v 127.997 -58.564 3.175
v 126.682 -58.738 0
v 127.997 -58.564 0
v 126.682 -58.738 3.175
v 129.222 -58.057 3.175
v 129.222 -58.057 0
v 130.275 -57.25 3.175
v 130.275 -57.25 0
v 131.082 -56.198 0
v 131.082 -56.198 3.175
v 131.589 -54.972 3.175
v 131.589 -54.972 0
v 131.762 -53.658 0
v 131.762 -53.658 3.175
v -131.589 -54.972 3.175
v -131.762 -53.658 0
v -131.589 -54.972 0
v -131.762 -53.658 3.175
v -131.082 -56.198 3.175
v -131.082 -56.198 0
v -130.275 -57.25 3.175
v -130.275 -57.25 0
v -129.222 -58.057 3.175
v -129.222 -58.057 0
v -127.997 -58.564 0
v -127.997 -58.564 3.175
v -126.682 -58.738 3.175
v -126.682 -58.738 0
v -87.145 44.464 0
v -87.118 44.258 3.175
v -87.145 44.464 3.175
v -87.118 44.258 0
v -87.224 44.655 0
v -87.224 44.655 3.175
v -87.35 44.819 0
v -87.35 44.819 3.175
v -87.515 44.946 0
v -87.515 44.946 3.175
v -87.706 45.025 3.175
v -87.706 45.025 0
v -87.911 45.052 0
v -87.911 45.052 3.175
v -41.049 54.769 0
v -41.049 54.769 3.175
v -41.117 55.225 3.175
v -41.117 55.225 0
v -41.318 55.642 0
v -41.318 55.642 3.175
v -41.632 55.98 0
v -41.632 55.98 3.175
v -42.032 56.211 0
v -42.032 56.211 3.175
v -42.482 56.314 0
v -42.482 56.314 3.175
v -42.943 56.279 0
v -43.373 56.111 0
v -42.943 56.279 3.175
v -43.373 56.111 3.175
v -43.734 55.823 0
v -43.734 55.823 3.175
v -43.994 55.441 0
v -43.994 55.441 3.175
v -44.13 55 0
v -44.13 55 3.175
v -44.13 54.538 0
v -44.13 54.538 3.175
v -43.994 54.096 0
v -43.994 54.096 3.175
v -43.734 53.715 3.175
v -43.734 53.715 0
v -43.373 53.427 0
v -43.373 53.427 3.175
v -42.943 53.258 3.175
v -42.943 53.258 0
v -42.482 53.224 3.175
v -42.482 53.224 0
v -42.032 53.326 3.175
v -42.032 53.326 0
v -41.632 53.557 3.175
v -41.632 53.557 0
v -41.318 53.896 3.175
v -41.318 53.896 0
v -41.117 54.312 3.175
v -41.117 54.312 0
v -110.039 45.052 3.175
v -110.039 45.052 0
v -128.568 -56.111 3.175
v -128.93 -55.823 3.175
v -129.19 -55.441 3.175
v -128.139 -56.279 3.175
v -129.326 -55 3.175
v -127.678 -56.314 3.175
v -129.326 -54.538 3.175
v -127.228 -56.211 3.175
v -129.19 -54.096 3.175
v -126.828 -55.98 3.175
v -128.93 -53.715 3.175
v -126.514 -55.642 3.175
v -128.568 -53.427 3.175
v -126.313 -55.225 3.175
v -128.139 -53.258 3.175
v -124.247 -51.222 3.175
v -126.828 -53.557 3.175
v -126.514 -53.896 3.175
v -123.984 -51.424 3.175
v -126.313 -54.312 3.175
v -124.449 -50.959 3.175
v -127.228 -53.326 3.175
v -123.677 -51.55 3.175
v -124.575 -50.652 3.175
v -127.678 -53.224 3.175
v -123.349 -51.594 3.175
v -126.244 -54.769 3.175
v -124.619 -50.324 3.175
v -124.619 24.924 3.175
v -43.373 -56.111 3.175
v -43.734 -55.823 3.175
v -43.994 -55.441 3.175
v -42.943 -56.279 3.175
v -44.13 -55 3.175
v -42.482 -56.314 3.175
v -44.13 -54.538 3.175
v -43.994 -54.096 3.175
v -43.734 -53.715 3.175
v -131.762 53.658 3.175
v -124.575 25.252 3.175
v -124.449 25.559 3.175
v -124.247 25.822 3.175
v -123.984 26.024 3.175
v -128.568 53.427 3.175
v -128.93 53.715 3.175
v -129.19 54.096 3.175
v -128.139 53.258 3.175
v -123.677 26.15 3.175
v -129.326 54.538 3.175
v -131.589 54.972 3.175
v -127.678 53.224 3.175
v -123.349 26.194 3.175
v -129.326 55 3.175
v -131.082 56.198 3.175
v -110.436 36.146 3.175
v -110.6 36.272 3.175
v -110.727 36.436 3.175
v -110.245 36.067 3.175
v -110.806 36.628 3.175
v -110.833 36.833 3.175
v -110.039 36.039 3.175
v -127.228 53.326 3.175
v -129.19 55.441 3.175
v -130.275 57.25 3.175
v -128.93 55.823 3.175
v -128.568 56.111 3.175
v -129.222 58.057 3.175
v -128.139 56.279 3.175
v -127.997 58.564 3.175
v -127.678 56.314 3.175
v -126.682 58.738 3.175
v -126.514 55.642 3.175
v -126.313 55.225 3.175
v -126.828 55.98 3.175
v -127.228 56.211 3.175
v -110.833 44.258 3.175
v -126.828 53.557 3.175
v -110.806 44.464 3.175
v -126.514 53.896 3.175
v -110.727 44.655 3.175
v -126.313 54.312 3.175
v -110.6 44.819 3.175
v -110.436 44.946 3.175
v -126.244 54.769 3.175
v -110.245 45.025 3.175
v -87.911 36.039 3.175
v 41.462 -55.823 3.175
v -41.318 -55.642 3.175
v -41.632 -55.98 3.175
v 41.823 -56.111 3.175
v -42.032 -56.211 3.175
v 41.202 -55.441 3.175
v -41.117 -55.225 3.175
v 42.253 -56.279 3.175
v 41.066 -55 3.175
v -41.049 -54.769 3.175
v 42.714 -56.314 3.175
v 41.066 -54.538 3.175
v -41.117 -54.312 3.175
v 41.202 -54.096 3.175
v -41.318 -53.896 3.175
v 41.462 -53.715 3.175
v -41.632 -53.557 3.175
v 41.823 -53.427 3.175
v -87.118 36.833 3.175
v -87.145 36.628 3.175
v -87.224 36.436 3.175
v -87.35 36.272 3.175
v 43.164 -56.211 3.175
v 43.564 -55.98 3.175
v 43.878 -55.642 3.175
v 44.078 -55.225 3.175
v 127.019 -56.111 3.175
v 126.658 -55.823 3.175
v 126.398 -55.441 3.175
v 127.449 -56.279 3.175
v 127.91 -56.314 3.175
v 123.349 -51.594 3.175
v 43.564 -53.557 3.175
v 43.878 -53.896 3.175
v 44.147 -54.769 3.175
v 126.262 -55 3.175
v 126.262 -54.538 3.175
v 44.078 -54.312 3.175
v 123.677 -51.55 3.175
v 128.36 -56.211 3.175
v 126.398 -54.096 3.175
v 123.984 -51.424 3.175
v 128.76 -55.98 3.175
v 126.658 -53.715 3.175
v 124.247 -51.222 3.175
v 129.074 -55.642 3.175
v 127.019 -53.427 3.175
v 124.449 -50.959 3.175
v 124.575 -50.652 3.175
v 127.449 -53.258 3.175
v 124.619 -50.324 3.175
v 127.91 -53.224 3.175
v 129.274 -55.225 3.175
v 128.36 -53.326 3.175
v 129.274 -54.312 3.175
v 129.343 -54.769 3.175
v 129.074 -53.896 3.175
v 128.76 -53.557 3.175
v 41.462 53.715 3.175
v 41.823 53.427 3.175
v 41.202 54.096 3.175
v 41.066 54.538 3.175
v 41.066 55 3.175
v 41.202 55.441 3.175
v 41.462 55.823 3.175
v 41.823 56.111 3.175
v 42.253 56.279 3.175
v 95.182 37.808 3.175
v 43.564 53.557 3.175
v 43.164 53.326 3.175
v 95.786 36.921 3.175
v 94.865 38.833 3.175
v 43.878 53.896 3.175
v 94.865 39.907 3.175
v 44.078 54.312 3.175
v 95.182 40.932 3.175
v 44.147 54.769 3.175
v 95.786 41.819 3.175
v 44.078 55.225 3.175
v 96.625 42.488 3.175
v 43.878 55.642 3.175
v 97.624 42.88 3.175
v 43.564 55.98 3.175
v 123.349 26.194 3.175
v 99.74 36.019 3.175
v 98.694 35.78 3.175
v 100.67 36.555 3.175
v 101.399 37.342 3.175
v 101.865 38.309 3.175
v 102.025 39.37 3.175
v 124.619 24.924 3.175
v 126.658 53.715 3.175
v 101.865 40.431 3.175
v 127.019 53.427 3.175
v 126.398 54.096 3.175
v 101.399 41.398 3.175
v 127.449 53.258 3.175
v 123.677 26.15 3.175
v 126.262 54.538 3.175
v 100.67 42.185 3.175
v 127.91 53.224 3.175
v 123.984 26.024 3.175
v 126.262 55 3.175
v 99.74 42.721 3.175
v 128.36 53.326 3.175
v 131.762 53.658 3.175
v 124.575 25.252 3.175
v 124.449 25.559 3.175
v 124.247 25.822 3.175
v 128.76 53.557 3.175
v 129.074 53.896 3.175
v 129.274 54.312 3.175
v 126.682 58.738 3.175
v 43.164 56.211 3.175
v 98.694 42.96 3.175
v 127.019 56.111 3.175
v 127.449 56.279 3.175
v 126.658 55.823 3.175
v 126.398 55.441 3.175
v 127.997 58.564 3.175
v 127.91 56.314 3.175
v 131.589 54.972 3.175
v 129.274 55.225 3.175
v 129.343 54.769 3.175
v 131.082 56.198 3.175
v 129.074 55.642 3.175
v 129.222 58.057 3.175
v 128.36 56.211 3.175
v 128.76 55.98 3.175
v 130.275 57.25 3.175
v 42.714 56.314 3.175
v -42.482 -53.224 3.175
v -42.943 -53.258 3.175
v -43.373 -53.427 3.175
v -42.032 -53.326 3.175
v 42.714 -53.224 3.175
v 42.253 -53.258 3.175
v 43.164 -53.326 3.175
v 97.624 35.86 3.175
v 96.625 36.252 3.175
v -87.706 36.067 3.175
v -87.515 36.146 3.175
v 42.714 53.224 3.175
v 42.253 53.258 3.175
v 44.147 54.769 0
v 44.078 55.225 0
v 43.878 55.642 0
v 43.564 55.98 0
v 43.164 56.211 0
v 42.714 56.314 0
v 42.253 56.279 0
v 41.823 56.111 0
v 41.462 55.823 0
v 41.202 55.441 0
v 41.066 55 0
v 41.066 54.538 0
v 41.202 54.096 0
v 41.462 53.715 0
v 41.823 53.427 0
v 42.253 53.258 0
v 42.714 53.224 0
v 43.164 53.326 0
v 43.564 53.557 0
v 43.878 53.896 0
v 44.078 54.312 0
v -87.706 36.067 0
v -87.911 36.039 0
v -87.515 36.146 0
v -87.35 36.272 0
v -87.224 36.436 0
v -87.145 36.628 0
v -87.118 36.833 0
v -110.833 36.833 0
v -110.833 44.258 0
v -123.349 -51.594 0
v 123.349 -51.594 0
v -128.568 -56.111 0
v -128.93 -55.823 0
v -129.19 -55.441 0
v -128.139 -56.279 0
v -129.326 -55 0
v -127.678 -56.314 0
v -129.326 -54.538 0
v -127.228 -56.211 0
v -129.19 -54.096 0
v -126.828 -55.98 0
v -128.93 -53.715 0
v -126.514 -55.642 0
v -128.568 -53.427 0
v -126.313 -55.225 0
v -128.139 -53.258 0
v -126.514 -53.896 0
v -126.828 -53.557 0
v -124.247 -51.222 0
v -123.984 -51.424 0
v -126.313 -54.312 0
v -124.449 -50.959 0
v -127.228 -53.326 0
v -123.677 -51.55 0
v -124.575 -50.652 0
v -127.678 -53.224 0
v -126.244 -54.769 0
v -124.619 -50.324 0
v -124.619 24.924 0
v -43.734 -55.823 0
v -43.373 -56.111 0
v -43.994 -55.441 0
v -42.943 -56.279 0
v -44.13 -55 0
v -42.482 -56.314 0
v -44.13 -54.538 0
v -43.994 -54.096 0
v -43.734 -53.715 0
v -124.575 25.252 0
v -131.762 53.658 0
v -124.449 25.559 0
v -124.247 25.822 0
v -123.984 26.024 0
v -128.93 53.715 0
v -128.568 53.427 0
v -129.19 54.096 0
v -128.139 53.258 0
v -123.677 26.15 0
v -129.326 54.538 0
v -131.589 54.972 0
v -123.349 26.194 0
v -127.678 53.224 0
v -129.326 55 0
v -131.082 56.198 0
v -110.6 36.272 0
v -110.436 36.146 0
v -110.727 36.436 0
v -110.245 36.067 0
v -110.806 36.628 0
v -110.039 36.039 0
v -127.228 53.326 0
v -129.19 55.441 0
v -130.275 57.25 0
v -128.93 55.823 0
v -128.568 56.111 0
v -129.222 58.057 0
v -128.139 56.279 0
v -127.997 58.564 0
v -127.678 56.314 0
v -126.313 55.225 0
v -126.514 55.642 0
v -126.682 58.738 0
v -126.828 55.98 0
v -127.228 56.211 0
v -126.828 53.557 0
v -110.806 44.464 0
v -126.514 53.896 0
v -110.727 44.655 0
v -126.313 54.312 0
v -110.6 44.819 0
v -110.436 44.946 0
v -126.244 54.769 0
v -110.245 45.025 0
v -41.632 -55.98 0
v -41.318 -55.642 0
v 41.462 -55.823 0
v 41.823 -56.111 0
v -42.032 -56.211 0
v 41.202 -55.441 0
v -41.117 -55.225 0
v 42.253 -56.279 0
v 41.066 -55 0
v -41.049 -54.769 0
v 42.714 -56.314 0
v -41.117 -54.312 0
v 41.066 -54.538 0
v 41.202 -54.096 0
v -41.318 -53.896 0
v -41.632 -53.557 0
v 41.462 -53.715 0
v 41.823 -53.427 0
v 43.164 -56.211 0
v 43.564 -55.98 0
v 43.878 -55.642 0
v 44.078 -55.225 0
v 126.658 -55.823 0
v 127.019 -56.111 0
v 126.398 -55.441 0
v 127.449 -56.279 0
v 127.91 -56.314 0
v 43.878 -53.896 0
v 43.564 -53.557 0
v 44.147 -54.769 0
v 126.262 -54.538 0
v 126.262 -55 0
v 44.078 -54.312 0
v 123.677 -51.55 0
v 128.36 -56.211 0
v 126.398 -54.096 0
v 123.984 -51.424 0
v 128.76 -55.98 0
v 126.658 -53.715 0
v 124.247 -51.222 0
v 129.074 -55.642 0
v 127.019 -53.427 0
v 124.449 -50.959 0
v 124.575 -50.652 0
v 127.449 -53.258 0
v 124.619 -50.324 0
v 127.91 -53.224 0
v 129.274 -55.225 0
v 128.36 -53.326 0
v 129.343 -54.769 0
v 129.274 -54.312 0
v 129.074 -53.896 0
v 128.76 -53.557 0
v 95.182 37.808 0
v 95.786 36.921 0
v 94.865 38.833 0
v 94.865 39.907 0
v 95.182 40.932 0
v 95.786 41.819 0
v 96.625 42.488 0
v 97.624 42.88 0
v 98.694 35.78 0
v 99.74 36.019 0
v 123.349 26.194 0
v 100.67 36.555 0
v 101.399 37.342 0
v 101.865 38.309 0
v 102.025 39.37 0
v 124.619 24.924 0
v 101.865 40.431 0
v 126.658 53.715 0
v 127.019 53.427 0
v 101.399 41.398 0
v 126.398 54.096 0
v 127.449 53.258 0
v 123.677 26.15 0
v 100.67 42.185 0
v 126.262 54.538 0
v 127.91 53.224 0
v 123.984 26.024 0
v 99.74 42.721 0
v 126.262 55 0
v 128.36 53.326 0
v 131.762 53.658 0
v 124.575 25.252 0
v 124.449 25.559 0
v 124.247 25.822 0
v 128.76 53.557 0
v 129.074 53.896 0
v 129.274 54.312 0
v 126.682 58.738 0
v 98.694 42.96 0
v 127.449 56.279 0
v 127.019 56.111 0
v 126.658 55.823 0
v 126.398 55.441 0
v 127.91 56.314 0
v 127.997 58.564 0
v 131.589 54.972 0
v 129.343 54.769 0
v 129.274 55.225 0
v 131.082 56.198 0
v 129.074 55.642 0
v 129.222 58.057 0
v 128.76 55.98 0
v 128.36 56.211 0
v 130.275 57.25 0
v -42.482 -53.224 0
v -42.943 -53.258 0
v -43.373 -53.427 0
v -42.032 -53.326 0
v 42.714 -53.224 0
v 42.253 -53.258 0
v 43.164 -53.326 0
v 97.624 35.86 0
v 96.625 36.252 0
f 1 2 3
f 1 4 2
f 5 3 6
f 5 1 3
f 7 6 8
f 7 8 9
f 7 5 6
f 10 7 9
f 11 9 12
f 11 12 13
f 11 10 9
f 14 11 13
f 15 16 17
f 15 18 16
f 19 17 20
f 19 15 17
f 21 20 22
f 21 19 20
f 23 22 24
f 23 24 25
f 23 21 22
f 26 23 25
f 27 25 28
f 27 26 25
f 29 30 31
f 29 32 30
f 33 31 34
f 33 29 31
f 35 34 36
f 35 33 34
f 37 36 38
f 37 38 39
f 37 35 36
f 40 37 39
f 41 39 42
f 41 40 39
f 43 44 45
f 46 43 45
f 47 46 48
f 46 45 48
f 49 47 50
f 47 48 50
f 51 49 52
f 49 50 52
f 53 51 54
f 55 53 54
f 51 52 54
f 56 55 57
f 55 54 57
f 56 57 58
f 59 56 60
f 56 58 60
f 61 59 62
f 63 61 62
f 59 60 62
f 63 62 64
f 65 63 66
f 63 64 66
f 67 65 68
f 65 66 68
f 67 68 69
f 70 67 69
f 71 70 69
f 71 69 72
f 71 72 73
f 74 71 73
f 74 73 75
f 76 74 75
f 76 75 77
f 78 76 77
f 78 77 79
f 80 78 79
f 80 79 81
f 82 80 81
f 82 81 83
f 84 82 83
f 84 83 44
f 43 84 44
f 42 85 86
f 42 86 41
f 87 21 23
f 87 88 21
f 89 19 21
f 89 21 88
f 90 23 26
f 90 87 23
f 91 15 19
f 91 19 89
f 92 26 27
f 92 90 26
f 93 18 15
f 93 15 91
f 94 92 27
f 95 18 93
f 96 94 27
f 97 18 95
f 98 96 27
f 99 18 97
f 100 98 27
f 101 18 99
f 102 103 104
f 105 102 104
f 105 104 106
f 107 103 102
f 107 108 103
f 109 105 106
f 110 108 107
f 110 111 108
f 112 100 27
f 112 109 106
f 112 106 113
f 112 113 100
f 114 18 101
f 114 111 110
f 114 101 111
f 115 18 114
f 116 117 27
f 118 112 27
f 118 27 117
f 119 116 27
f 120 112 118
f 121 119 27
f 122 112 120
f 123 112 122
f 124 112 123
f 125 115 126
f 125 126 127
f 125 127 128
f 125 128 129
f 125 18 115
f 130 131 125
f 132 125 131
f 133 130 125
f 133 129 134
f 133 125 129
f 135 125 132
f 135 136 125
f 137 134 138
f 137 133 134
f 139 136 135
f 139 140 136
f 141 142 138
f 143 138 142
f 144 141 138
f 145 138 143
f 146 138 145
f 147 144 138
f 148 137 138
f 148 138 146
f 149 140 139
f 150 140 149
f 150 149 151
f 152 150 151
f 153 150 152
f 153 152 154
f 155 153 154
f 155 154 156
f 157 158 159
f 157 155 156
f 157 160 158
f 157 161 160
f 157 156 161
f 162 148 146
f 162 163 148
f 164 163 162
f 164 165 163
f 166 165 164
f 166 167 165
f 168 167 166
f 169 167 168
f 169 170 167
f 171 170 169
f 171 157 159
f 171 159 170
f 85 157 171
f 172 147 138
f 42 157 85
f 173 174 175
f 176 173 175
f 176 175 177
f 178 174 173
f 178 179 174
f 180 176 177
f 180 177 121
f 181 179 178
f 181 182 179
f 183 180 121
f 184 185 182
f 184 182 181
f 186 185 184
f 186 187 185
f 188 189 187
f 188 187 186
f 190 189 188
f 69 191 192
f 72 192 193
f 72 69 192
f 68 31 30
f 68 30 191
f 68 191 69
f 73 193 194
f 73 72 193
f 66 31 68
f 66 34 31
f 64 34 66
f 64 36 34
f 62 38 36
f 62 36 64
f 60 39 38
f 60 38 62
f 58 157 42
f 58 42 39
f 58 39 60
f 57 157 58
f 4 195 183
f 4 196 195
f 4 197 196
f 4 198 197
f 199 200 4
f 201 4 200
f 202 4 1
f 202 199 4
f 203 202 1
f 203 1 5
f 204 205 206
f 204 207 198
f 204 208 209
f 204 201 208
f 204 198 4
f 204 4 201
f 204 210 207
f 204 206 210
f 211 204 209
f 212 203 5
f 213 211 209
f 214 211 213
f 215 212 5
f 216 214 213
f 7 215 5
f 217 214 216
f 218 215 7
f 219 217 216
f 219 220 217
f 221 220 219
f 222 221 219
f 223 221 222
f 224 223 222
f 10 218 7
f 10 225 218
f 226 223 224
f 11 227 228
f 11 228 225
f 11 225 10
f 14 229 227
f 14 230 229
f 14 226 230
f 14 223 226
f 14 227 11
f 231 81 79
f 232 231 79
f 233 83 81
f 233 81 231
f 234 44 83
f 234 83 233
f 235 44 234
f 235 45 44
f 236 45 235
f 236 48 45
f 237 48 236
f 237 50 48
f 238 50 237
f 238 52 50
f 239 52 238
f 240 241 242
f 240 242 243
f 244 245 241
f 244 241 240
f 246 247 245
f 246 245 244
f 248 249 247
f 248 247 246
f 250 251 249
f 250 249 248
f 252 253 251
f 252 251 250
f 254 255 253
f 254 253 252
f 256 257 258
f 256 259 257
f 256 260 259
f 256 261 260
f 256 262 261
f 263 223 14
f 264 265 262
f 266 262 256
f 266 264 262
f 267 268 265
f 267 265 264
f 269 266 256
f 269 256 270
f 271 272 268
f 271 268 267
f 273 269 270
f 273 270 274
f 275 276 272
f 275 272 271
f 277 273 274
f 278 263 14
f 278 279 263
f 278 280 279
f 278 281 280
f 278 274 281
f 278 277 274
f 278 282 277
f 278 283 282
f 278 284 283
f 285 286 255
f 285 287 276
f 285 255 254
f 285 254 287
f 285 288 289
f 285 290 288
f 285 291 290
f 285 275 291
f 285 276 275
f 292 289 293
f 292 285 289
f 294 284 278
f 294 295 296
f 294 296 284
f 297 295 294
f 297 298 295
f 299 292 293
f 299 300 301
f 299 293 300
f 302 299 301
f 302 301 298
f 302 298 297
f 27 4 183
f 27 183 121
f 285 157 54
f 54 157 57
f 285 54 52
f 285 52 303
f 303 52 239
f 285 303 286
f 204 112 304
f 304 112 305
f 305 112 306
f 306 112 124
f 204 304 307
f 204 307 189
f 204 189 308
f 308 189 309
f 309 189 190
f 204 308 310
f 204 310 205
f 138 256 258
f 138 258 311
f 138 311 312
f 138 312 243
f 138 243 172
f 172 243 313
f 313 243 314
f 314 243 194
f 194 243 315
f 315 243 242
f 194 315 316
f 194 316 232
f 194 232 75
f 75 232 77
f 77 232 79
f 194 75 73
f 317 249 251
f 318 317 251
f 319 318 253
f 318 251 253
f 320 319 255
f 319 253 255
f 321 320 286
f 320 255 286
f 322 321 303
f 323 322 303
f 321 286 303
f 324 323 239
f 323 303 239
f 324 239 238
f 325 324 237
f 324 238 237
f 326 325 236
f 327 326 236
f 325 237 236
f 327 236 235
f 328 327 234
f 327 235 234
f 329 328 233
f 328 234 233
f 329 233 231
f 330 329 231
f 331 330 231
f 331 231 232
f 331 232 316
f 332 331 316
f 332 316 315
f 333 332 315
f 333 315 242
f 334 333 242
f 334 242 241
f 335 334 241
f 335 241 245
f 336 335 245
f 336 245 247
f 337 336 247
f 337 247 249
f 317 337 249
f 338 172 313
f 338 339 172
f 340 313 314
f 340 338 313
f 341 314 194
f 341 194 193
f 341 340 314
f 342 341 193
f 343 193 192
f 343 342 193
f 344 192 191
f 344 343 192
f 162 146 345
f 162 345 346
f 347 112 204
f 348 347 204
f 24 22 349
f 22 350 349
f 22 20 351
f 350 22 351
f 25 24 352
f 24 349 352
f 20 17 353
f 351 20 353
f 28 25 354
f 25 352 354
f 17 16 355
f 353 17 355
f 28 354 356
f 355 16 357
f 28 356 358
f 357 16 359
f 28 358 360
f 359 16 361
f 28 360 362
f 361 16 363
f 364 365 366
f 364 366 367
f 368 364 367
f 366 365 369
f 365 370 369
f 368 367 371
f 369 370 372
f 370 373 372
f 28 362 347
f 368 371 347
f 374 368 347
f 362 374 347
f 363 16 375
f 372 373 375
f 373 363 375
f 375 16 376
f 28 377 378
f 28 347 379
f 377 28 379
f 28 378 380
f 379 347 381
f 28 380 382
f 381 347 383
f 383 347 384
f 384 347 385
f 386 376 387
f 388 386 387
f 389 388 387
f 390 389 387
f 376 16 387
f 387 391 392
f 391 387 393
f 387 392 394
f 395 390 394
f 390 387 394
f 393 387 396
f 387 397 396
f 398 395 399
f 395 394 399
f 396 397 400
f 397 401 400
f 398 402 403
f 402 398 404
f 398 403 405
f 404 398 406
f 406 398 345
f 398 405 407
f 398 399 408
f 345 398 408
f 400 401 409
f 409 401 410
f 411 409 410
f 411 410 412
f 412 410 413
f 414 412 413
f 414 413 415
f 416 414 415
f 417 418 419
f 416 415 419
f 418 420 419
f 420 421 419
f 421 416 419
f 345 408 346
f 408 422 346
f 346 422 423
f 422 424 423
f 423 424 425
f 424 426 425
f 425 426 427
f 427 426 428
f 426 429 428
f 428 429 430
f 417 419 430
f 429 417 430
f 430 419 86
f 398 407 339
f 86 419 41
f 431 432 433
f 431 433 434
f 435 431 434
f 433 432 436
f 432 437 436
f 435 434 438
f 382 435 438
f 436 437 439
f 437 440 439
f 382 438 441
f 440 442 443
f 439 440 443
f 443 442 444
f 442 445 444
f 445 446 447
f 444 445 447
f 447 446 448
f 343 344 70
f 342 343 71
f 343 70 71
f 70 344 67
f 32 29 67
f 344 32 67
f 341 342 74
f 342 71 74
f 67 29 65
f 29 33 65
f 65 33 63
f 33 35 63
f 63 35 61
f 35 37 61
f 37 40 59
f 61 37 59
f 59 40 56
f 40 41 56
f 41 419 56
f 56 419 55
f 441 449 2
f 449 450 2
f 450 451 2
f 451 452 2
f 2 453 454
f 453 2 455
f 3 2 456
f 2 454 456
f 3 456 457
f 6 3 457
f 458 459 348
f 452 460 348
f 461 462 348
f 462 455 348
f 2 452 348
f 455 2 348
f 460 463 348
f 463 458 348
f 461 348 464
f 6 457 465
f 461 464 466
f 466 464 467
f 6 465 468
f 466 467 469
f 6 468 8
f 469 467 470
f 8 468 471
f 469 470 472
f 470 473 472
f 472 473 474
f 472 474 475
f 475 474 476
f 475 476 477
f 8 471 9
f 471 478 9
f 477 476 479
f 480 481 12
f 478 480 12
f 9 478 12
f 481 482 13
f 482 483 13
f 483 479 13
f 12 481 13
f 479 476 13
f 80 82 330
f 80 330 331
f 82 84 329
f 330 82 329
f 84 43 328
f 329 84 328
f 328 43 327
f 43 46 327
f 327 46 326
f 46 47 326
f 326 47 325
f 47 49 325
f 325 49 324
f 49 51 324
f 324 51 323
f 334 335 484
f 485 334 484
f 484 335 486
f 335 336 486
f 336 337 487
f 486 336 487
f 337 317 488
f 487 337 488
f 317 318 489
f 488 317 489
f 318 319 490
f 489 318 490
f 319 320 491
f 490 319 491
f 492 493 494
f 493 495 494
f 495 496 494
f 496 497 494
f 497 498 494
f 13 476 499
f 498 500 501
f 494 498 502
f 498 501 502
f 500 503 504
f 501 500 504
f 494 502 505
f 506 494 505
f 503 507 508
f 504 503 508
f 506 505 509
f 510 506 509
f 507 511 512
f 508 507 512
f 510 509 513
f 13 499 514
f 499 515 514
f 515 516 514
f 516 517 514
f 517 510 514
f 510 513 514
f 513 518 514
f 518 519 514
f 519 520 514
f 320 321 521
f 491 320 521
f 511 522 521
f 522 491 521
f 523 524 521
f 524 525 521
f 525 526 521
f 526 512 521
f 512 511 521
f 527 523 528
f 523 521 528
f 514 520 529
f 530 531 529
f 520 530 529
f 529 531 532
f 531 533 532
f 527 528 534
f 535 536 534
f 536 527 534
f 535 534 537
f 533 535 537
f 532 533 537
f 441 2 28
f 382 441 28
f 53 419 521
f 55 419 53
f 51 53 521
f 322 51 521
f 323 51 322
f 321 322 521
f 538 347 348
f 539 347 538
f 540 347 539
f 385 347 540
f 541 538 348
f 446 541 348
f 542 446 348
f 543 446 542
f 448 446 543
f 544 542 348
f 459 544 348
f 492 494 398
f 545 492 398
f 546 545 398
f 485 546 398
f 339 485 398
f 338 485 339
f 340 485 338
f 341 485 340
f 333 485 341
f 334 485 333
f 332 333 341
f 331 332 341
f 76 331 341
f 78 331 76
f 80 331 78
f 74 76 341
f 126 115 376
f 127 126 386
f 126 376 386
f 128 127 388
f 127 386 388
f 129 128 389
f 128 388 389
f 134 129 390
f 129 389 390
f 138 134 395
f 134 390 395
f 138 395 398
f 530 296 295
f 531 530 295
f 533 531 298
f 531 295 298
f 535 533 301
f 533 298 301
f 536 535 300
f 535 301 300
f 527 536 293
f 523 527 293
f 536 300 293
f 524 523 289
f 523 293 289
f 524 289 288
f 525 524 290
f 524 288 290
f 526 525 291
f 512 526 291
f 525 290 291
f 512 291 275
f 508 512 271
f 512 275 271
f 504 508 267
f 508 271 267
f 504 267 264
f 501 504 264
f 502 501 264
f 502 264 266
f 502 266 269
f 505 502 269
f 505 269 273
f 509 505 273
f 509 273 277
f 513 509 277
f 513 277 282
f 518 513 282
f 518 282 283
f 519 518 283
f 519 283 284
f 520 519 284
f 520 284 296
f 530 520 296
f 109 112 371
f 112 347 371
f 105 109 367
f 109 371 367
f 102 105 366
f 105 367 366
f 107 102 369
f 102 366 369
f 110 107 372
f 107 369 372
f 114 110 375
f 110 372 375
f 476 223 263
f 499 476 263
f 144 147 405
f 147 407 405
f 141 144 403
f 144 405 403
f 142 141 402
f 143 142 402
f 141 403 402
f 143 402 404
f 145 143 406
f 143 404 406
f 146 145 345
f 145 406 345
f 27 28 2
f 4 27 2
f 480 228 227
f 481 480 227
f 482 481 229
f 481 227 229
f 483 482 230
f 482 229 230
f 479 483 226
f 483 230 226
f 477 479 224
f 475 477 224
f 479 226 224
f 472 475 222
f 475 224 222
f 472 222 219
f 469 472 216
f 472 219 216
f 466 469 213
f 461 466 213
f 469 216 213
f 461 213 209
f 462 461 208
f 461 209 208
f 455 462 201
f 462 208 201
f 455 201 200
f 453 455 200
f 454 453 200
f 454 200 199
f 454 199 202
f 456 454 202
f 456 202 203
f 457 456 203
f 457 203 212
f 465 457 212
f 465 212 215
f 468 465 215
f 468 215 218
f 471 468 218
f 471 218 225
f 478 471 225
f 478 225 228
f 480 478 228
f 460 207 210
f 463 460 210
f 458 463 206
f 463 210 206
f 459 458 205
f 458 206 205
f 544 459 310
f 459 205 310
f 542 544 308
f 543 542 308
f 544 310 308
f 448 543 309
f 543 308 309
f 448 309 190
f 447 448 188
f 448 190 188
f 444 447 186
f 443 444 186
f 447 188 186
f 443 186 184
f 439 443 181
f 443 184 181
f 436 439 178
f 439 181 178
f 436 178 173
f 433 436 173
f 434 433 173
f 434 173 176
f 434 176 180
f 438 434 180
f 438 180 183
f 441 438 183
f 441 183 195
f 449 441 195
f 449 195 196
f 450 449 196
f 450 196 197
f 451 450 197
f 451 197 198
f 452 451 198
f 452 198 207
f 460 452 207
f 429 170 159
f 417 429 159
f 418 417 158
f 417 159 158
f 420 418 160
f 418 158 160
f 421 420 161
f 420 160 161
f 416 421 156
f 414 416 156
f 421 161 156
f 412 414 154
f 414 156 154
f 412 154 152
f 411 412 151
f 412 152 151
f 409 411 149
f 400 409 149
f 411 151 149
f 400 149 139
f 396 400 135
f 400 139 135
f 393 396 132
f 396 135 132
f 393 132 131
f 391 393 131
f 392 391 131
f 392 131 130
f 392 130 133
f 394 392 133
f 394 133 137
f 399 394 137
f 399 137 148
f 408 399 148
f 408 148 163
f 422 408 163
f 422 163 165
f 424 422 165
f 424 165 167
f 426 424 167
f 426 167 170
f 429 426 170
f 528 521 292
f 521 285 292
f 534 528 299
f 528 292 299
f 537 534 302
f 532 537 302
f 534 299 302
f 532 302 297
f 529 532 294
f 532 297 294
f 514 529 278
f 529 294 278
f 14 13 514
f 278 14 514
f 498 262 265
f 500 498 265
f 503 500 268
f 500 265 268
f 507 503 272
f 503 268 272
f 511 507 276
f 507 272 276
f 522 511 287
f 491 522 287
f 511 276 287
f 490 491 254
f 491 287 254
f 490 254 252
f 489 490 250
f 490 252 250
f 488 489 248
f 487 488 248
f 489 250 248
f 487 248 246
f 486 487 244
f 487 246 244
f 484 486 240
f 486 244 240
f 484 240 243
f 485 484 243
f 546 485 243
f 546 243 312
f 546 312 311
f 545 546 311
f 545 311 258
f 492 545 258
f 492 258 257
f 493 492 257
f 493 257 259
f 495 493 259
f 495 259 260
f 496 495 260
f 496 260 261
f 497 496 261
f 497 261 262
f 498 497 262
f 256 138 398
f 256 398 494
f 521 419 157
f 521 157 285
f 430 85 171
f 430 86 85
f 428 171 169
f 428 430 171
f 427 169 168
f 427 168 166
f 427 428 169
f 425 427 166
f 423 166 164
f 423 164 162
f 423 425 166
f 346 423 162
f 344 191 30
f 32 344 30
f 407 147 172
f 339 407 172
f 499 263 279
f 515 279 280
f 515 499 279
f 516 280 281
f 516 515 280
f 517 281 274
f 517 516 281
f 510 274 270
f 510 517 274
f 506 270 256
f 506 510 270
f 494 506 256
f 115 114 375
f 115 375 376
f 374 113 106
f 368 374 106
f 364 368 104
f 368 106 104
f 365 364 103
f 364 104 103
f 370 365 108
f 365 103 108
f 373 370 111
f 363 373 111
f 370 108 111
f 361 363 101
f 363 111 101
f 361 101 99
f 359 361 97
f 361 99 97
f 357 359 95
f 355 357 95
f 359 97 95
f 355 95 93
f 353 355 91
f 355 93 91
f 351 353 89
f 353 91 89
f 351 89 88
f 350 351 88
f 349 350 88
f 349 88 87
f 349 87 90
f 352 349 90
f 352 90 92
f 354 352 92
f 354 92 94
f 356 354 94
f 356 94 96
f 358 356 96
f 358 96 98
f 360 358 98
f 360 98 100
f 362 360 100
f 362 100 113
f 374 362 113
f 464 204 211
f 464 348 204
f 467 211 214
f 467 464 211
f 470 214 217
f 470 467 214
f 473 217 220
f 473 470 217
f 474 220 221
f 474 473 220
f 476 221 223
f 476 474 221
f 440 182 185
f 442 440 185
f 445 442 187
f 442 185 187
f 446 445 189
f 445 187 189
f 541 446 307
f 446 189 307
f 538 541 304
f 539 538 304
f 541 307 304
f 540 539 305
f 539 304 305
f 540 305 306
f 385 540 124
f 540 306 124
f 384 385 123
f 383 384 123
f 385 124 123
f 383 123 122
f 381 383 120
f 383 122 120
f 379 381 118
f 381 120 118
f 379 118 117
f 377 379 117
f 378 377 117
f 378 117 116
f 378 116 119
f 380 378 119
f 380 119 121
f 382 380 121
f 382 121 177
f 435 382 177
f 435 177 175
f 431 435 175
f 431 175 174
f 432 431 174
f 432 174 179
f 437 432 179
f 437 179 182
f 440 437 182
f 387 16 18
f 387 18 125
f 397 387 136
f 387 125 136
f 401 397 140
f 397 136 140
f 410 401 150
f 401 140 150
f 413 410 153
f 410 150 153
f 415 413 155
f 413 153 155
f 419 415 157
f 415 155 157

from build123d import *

# Parameters (mm, degrees)
SKETCH_W        = 263.525
SKETCH_H        = 117.475
PAD_DEPTH       = 3.175
SKETCH002_W     = 249.2375
SKETCH002_H     = 77.7875
POCKET_DEPTH    = 3.176
SKETCH003_R     = 3.6
POCKET001_DEPTH = 3.176
SKETCH001_R     = 1.5494
HOLE_DEPTH      = 3.176
FILLET_R        = 5.08
FILLET001_R     = 1.27
SKETCH004_W     = 23.715193
SKETCH004_H     = 9.0125
POCKET002_DEPTH = 3.176
FILLET002_R     = 0.79375


with BuildPart() as part:
    # Sketch → Pad (new body)
    with BuildSketch(Plane.XY):
        Rectangle(SKETCH_W, SKETCH_H)
    extrude(amount=PAD_DEPTH)

    # Sketch002 (on Face6 of Pad) → Pocket (cut, through all)
    with BuildSketch(Plane.XY.offset(3.175)):
        with Locations((0, -12.7)):
            Rectangle(SKETCH002_W, SKETCH002_H)
    extrude(amount=-POCKET_DEPTH, mode=Mode.SUBTRACT)

    # Sketch003 (on Face5 of Pocket) → Pocket001 (cut, through all)
    with BuildSketch(Plane.XY.offset(3.175)):
        with Locations((98.425, 39.37)):
            Circle(SKETCH003_R)
    extrude(amount=-POCKET001_DEPTH, mode=Mode.SUBTRACT)

    # Sketch001 (on Face6 of Pad) → Hole (cut, through all)
    with BuildSketch(Plane.XY.offset(3.175)):
        with Locations((-42.597917, 54.76875)):
            Circle(SKETCH001_R)
        with Locations((42.597917, 54.76875)):
            Circle(SKETCH001_R)
        with Locations((42.597917, -54.76875)):
            Circle(SKETCH001_R)
        with Locations((-42.597917, -54.76875)):
            Circle(SKETCH001_R)
        with Locations((-127.79375, -54.76875)):
            Circle(SKETCH001_R)
        with Locations((-127.79375, 54.76875)):
            Circle(SKETCH001_R)
        with Locations((127.79375, 54.76875)):
            Circle(SKETCH001_R)
        with Locations((127.79375, -54.76875)):
            Circle(SKETCH001_R)
    extrude(amount=-HOLE_DEPTH, mode=Mode.SUBTRACT)

    # Fillet
    fillet_edges = [part.edges().sort_by_distance(p)[0] for p in [
        (-131.7625, 58.7375, 1.5875),
        (-131.7625, -58.7375, 1.5875),
        (131.7625, -58.7375, 1.5875),
        (131.7625, 58.7375, 1.5875),
    ]]
    fillet(fillet_edges, radius=FILLET_R)

    # Fillet001
    fillet001_edges = [part.edges().sort_by_distance(p)[0] for p in [
        (-124.61875, -51.59375, 1.5875),
        (-124.61875, 26.19375, 1.5875),
        (124.61875, 26.19375, 1.5875),
        (124.61875, -51.59375, 1.5875),
    ]]
    fillet(fillet001_edges, radius=FILLET001_R)

    # Sketch004 (on Face5 of Pocket001) → Pocket002 (cut, through all)
    with BuildSketch(Plane.XY.offset(3.175)):
        with Locations((-98.975303, 40.54573)):
            Rectangle(SKETCH004_W, SKETCH004_H)
    extrude(amount=-POCKET002_DEPTH, mode=Mode.SUBTRACT)

    # Fillet002
    fillet002_edges = [part.edges().sort_by_distance(p)[0] for p in [
        (-110.8329, 45.05198, 1.5875),
        (-87.117707, 45.05198, 1.5875),
        (-87.117707, 36.03948, 1.5875),
        (-110.8329, 36.03948, 1.5875),
    ]]
    fillet(fillet002_edges, radius=FILLET002_R)


solid = part.part
